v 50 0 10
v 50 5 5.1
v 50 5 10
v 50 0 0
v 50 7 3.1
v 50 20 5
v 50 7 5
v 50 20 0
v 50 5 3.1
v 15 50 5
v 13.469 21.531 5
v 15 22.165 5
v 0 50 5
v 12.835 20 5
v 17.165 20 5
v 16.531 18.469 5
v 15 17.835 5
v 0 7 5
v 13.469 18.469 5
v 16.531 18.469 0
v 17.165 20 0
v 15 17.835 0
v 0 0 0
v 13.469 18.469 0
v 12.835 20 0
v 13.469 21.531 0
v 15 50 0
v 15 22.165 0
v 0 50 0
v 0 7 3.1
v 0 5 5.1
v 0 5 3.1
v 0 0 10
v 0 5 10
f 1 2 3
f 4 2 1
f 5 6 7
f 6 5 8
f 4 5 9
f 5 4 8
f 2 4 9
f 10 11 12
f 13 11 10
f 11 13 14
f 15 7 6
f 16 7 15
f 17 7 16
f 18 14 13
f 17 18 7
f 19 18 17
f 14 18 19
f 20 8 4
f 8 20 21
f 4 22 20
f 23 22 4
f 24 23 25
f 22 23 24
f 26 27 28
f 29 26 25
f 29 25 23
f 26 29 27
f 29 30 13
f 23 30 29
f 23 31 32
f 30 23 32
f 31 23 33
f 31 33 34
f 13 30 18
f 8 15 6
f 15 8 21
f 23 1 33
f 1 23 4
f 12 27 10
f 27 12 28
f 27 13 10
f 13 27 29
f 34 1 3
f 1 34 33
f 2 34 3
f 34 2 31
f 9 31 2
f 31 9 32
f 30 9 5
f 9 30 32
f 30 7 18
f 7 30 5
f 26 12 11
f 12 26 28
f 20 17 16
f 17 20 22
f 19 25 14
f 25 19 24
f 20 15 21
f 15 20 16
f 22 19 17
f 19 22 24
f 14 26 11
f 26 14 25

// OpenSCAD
//-----------------------------------------------------------------------------------
// square ruler
// (German: Schlosserwinkel mit Anschlag)
//
// http://www.thingiverse.com/thing:145693
// https://github.com/Stemer114/things/tree/master/tools 
//
// (c) 2013 by Stemer114
// License: licensed under the Creative Commons - GNU GPL license.
//          http://www.gnu.org/licenses/gpl-2.0.html
//-----------------------------------------------------------------------------------

//-----------------------------------------------------------------------------------
//display settings
//-----------------------------------------------------------------------------------

//color settings

//-----------------------------------------------------------------------------------
//global configuration settings
//-----------------------------------------------------------------------------------
de = 0.1; //delta param, so differences do not become manifold
fn_hole = 12;  //fn setting for round holes/bores (polyhole)
ex = 0;  //offset for Explosivdarstellung, set to 0 for none

//-----------------------------------------------------------------------------------
// parametric settings (in mm)
//-----------------------------------------------------------------------------------

show_mirrored = false;
//show_mirrored = true;

P1  = 50;  //side 1 length
P2  = 50;  //side 2 length
P3  = 20;  //side 1 width
P4  = 15;  //side 2 width
P5  =  5;  //leg thickness
P10 = 10;  //guide thickness (Anschlag)
P11 = 5;  //guide width
P20 =  2;  //groove width
P21 =  2;  //groove depth
P30 =  4;  //corner cutout diameter (polyhole)

//-----------------------------------------------------------------------------------
// libraries
//-----------------------------------------------------------------------------------

//-----------------------------------------------------------------------------------
// main rendering
//-----------------------------------------------------------------------------------


//transparent 10mm cube for debugging
//translate([0, 0, -10])
//% cube(10, 10, 10);

if (show_mirrored) {
    mirror([ 0, 1, 0 ]) SquareRuler();
} else {
    SquareRuler();
}


//-----------------------------------------------------------------------------------
// modules
//-----------------------------------------------------------------------------------

module SquareRuler()
{
    difference()
    {
        union()
        {
            //side 1
            translate([0, 0, 0])
                cube([P1, P3, P5], center=false);

            //side 2
            translate([0, 0, 0])
                cube([P4, P2, P5], center=false);

            //guide
            translate([0, 0, 0])
                cube([P1, P11, P10], center=false);

        }  //end union

        union()
        {
            //groove
            translate([-de, P11, P5+de-P21])
                cube([P1+2*de, P20, P21], center=false);

            //corner cutout
            translate([P4, P3, -de])
                polyhole(P5+2*de, P30);
 
 
        } //end union

    }  //end difference

}  //end module SquareRuler


//-----------------------------------------------------------------------------------
// utility functions
//-----------------------------------------------------------------------------------

//polyhole by nophead
//see http://hydraraptor.blogspot.de/2011/02/polyholes.html
module polyhole(h, d) {
    n = max(round(2 * d),3);
    rotate([0,0,180])
        cylinder(h = h, r = (d / 2) / cos (180 / n), $fn = n);
}


/* creates a cube with rounded corners in z direction
   with the corners array it can be specified, which corners are rounded
   (default: all)
   */
module CubeRounded(x, y, z, r, corners=[1, 1, 1, 1]) {
    $fn=20;

    hull() {
        //lower left
        translate([r, r, 0]) 
            CubeCorner(r, z, corners[0]);

        //lower right
        translate([x-r, r, 0])
            CubeCorner(r, z, corners[1]);

        //upper left
        translate([r, y-r, 0])
            CubeCorner(r, z, corners[2]);

        //upper right
        translate([x-r, y-r, 0])
            CubeCorner(r, z, corners[3]);
    }
}

module CubeCorner(r, z, cornermode) {
    if (cornermode==1) {
        cylinder(h=z, r=r);
    } else {
        translate([0, 0, z/2])
            cube([2*r, 2*r, z], center=true);
    }
} 
